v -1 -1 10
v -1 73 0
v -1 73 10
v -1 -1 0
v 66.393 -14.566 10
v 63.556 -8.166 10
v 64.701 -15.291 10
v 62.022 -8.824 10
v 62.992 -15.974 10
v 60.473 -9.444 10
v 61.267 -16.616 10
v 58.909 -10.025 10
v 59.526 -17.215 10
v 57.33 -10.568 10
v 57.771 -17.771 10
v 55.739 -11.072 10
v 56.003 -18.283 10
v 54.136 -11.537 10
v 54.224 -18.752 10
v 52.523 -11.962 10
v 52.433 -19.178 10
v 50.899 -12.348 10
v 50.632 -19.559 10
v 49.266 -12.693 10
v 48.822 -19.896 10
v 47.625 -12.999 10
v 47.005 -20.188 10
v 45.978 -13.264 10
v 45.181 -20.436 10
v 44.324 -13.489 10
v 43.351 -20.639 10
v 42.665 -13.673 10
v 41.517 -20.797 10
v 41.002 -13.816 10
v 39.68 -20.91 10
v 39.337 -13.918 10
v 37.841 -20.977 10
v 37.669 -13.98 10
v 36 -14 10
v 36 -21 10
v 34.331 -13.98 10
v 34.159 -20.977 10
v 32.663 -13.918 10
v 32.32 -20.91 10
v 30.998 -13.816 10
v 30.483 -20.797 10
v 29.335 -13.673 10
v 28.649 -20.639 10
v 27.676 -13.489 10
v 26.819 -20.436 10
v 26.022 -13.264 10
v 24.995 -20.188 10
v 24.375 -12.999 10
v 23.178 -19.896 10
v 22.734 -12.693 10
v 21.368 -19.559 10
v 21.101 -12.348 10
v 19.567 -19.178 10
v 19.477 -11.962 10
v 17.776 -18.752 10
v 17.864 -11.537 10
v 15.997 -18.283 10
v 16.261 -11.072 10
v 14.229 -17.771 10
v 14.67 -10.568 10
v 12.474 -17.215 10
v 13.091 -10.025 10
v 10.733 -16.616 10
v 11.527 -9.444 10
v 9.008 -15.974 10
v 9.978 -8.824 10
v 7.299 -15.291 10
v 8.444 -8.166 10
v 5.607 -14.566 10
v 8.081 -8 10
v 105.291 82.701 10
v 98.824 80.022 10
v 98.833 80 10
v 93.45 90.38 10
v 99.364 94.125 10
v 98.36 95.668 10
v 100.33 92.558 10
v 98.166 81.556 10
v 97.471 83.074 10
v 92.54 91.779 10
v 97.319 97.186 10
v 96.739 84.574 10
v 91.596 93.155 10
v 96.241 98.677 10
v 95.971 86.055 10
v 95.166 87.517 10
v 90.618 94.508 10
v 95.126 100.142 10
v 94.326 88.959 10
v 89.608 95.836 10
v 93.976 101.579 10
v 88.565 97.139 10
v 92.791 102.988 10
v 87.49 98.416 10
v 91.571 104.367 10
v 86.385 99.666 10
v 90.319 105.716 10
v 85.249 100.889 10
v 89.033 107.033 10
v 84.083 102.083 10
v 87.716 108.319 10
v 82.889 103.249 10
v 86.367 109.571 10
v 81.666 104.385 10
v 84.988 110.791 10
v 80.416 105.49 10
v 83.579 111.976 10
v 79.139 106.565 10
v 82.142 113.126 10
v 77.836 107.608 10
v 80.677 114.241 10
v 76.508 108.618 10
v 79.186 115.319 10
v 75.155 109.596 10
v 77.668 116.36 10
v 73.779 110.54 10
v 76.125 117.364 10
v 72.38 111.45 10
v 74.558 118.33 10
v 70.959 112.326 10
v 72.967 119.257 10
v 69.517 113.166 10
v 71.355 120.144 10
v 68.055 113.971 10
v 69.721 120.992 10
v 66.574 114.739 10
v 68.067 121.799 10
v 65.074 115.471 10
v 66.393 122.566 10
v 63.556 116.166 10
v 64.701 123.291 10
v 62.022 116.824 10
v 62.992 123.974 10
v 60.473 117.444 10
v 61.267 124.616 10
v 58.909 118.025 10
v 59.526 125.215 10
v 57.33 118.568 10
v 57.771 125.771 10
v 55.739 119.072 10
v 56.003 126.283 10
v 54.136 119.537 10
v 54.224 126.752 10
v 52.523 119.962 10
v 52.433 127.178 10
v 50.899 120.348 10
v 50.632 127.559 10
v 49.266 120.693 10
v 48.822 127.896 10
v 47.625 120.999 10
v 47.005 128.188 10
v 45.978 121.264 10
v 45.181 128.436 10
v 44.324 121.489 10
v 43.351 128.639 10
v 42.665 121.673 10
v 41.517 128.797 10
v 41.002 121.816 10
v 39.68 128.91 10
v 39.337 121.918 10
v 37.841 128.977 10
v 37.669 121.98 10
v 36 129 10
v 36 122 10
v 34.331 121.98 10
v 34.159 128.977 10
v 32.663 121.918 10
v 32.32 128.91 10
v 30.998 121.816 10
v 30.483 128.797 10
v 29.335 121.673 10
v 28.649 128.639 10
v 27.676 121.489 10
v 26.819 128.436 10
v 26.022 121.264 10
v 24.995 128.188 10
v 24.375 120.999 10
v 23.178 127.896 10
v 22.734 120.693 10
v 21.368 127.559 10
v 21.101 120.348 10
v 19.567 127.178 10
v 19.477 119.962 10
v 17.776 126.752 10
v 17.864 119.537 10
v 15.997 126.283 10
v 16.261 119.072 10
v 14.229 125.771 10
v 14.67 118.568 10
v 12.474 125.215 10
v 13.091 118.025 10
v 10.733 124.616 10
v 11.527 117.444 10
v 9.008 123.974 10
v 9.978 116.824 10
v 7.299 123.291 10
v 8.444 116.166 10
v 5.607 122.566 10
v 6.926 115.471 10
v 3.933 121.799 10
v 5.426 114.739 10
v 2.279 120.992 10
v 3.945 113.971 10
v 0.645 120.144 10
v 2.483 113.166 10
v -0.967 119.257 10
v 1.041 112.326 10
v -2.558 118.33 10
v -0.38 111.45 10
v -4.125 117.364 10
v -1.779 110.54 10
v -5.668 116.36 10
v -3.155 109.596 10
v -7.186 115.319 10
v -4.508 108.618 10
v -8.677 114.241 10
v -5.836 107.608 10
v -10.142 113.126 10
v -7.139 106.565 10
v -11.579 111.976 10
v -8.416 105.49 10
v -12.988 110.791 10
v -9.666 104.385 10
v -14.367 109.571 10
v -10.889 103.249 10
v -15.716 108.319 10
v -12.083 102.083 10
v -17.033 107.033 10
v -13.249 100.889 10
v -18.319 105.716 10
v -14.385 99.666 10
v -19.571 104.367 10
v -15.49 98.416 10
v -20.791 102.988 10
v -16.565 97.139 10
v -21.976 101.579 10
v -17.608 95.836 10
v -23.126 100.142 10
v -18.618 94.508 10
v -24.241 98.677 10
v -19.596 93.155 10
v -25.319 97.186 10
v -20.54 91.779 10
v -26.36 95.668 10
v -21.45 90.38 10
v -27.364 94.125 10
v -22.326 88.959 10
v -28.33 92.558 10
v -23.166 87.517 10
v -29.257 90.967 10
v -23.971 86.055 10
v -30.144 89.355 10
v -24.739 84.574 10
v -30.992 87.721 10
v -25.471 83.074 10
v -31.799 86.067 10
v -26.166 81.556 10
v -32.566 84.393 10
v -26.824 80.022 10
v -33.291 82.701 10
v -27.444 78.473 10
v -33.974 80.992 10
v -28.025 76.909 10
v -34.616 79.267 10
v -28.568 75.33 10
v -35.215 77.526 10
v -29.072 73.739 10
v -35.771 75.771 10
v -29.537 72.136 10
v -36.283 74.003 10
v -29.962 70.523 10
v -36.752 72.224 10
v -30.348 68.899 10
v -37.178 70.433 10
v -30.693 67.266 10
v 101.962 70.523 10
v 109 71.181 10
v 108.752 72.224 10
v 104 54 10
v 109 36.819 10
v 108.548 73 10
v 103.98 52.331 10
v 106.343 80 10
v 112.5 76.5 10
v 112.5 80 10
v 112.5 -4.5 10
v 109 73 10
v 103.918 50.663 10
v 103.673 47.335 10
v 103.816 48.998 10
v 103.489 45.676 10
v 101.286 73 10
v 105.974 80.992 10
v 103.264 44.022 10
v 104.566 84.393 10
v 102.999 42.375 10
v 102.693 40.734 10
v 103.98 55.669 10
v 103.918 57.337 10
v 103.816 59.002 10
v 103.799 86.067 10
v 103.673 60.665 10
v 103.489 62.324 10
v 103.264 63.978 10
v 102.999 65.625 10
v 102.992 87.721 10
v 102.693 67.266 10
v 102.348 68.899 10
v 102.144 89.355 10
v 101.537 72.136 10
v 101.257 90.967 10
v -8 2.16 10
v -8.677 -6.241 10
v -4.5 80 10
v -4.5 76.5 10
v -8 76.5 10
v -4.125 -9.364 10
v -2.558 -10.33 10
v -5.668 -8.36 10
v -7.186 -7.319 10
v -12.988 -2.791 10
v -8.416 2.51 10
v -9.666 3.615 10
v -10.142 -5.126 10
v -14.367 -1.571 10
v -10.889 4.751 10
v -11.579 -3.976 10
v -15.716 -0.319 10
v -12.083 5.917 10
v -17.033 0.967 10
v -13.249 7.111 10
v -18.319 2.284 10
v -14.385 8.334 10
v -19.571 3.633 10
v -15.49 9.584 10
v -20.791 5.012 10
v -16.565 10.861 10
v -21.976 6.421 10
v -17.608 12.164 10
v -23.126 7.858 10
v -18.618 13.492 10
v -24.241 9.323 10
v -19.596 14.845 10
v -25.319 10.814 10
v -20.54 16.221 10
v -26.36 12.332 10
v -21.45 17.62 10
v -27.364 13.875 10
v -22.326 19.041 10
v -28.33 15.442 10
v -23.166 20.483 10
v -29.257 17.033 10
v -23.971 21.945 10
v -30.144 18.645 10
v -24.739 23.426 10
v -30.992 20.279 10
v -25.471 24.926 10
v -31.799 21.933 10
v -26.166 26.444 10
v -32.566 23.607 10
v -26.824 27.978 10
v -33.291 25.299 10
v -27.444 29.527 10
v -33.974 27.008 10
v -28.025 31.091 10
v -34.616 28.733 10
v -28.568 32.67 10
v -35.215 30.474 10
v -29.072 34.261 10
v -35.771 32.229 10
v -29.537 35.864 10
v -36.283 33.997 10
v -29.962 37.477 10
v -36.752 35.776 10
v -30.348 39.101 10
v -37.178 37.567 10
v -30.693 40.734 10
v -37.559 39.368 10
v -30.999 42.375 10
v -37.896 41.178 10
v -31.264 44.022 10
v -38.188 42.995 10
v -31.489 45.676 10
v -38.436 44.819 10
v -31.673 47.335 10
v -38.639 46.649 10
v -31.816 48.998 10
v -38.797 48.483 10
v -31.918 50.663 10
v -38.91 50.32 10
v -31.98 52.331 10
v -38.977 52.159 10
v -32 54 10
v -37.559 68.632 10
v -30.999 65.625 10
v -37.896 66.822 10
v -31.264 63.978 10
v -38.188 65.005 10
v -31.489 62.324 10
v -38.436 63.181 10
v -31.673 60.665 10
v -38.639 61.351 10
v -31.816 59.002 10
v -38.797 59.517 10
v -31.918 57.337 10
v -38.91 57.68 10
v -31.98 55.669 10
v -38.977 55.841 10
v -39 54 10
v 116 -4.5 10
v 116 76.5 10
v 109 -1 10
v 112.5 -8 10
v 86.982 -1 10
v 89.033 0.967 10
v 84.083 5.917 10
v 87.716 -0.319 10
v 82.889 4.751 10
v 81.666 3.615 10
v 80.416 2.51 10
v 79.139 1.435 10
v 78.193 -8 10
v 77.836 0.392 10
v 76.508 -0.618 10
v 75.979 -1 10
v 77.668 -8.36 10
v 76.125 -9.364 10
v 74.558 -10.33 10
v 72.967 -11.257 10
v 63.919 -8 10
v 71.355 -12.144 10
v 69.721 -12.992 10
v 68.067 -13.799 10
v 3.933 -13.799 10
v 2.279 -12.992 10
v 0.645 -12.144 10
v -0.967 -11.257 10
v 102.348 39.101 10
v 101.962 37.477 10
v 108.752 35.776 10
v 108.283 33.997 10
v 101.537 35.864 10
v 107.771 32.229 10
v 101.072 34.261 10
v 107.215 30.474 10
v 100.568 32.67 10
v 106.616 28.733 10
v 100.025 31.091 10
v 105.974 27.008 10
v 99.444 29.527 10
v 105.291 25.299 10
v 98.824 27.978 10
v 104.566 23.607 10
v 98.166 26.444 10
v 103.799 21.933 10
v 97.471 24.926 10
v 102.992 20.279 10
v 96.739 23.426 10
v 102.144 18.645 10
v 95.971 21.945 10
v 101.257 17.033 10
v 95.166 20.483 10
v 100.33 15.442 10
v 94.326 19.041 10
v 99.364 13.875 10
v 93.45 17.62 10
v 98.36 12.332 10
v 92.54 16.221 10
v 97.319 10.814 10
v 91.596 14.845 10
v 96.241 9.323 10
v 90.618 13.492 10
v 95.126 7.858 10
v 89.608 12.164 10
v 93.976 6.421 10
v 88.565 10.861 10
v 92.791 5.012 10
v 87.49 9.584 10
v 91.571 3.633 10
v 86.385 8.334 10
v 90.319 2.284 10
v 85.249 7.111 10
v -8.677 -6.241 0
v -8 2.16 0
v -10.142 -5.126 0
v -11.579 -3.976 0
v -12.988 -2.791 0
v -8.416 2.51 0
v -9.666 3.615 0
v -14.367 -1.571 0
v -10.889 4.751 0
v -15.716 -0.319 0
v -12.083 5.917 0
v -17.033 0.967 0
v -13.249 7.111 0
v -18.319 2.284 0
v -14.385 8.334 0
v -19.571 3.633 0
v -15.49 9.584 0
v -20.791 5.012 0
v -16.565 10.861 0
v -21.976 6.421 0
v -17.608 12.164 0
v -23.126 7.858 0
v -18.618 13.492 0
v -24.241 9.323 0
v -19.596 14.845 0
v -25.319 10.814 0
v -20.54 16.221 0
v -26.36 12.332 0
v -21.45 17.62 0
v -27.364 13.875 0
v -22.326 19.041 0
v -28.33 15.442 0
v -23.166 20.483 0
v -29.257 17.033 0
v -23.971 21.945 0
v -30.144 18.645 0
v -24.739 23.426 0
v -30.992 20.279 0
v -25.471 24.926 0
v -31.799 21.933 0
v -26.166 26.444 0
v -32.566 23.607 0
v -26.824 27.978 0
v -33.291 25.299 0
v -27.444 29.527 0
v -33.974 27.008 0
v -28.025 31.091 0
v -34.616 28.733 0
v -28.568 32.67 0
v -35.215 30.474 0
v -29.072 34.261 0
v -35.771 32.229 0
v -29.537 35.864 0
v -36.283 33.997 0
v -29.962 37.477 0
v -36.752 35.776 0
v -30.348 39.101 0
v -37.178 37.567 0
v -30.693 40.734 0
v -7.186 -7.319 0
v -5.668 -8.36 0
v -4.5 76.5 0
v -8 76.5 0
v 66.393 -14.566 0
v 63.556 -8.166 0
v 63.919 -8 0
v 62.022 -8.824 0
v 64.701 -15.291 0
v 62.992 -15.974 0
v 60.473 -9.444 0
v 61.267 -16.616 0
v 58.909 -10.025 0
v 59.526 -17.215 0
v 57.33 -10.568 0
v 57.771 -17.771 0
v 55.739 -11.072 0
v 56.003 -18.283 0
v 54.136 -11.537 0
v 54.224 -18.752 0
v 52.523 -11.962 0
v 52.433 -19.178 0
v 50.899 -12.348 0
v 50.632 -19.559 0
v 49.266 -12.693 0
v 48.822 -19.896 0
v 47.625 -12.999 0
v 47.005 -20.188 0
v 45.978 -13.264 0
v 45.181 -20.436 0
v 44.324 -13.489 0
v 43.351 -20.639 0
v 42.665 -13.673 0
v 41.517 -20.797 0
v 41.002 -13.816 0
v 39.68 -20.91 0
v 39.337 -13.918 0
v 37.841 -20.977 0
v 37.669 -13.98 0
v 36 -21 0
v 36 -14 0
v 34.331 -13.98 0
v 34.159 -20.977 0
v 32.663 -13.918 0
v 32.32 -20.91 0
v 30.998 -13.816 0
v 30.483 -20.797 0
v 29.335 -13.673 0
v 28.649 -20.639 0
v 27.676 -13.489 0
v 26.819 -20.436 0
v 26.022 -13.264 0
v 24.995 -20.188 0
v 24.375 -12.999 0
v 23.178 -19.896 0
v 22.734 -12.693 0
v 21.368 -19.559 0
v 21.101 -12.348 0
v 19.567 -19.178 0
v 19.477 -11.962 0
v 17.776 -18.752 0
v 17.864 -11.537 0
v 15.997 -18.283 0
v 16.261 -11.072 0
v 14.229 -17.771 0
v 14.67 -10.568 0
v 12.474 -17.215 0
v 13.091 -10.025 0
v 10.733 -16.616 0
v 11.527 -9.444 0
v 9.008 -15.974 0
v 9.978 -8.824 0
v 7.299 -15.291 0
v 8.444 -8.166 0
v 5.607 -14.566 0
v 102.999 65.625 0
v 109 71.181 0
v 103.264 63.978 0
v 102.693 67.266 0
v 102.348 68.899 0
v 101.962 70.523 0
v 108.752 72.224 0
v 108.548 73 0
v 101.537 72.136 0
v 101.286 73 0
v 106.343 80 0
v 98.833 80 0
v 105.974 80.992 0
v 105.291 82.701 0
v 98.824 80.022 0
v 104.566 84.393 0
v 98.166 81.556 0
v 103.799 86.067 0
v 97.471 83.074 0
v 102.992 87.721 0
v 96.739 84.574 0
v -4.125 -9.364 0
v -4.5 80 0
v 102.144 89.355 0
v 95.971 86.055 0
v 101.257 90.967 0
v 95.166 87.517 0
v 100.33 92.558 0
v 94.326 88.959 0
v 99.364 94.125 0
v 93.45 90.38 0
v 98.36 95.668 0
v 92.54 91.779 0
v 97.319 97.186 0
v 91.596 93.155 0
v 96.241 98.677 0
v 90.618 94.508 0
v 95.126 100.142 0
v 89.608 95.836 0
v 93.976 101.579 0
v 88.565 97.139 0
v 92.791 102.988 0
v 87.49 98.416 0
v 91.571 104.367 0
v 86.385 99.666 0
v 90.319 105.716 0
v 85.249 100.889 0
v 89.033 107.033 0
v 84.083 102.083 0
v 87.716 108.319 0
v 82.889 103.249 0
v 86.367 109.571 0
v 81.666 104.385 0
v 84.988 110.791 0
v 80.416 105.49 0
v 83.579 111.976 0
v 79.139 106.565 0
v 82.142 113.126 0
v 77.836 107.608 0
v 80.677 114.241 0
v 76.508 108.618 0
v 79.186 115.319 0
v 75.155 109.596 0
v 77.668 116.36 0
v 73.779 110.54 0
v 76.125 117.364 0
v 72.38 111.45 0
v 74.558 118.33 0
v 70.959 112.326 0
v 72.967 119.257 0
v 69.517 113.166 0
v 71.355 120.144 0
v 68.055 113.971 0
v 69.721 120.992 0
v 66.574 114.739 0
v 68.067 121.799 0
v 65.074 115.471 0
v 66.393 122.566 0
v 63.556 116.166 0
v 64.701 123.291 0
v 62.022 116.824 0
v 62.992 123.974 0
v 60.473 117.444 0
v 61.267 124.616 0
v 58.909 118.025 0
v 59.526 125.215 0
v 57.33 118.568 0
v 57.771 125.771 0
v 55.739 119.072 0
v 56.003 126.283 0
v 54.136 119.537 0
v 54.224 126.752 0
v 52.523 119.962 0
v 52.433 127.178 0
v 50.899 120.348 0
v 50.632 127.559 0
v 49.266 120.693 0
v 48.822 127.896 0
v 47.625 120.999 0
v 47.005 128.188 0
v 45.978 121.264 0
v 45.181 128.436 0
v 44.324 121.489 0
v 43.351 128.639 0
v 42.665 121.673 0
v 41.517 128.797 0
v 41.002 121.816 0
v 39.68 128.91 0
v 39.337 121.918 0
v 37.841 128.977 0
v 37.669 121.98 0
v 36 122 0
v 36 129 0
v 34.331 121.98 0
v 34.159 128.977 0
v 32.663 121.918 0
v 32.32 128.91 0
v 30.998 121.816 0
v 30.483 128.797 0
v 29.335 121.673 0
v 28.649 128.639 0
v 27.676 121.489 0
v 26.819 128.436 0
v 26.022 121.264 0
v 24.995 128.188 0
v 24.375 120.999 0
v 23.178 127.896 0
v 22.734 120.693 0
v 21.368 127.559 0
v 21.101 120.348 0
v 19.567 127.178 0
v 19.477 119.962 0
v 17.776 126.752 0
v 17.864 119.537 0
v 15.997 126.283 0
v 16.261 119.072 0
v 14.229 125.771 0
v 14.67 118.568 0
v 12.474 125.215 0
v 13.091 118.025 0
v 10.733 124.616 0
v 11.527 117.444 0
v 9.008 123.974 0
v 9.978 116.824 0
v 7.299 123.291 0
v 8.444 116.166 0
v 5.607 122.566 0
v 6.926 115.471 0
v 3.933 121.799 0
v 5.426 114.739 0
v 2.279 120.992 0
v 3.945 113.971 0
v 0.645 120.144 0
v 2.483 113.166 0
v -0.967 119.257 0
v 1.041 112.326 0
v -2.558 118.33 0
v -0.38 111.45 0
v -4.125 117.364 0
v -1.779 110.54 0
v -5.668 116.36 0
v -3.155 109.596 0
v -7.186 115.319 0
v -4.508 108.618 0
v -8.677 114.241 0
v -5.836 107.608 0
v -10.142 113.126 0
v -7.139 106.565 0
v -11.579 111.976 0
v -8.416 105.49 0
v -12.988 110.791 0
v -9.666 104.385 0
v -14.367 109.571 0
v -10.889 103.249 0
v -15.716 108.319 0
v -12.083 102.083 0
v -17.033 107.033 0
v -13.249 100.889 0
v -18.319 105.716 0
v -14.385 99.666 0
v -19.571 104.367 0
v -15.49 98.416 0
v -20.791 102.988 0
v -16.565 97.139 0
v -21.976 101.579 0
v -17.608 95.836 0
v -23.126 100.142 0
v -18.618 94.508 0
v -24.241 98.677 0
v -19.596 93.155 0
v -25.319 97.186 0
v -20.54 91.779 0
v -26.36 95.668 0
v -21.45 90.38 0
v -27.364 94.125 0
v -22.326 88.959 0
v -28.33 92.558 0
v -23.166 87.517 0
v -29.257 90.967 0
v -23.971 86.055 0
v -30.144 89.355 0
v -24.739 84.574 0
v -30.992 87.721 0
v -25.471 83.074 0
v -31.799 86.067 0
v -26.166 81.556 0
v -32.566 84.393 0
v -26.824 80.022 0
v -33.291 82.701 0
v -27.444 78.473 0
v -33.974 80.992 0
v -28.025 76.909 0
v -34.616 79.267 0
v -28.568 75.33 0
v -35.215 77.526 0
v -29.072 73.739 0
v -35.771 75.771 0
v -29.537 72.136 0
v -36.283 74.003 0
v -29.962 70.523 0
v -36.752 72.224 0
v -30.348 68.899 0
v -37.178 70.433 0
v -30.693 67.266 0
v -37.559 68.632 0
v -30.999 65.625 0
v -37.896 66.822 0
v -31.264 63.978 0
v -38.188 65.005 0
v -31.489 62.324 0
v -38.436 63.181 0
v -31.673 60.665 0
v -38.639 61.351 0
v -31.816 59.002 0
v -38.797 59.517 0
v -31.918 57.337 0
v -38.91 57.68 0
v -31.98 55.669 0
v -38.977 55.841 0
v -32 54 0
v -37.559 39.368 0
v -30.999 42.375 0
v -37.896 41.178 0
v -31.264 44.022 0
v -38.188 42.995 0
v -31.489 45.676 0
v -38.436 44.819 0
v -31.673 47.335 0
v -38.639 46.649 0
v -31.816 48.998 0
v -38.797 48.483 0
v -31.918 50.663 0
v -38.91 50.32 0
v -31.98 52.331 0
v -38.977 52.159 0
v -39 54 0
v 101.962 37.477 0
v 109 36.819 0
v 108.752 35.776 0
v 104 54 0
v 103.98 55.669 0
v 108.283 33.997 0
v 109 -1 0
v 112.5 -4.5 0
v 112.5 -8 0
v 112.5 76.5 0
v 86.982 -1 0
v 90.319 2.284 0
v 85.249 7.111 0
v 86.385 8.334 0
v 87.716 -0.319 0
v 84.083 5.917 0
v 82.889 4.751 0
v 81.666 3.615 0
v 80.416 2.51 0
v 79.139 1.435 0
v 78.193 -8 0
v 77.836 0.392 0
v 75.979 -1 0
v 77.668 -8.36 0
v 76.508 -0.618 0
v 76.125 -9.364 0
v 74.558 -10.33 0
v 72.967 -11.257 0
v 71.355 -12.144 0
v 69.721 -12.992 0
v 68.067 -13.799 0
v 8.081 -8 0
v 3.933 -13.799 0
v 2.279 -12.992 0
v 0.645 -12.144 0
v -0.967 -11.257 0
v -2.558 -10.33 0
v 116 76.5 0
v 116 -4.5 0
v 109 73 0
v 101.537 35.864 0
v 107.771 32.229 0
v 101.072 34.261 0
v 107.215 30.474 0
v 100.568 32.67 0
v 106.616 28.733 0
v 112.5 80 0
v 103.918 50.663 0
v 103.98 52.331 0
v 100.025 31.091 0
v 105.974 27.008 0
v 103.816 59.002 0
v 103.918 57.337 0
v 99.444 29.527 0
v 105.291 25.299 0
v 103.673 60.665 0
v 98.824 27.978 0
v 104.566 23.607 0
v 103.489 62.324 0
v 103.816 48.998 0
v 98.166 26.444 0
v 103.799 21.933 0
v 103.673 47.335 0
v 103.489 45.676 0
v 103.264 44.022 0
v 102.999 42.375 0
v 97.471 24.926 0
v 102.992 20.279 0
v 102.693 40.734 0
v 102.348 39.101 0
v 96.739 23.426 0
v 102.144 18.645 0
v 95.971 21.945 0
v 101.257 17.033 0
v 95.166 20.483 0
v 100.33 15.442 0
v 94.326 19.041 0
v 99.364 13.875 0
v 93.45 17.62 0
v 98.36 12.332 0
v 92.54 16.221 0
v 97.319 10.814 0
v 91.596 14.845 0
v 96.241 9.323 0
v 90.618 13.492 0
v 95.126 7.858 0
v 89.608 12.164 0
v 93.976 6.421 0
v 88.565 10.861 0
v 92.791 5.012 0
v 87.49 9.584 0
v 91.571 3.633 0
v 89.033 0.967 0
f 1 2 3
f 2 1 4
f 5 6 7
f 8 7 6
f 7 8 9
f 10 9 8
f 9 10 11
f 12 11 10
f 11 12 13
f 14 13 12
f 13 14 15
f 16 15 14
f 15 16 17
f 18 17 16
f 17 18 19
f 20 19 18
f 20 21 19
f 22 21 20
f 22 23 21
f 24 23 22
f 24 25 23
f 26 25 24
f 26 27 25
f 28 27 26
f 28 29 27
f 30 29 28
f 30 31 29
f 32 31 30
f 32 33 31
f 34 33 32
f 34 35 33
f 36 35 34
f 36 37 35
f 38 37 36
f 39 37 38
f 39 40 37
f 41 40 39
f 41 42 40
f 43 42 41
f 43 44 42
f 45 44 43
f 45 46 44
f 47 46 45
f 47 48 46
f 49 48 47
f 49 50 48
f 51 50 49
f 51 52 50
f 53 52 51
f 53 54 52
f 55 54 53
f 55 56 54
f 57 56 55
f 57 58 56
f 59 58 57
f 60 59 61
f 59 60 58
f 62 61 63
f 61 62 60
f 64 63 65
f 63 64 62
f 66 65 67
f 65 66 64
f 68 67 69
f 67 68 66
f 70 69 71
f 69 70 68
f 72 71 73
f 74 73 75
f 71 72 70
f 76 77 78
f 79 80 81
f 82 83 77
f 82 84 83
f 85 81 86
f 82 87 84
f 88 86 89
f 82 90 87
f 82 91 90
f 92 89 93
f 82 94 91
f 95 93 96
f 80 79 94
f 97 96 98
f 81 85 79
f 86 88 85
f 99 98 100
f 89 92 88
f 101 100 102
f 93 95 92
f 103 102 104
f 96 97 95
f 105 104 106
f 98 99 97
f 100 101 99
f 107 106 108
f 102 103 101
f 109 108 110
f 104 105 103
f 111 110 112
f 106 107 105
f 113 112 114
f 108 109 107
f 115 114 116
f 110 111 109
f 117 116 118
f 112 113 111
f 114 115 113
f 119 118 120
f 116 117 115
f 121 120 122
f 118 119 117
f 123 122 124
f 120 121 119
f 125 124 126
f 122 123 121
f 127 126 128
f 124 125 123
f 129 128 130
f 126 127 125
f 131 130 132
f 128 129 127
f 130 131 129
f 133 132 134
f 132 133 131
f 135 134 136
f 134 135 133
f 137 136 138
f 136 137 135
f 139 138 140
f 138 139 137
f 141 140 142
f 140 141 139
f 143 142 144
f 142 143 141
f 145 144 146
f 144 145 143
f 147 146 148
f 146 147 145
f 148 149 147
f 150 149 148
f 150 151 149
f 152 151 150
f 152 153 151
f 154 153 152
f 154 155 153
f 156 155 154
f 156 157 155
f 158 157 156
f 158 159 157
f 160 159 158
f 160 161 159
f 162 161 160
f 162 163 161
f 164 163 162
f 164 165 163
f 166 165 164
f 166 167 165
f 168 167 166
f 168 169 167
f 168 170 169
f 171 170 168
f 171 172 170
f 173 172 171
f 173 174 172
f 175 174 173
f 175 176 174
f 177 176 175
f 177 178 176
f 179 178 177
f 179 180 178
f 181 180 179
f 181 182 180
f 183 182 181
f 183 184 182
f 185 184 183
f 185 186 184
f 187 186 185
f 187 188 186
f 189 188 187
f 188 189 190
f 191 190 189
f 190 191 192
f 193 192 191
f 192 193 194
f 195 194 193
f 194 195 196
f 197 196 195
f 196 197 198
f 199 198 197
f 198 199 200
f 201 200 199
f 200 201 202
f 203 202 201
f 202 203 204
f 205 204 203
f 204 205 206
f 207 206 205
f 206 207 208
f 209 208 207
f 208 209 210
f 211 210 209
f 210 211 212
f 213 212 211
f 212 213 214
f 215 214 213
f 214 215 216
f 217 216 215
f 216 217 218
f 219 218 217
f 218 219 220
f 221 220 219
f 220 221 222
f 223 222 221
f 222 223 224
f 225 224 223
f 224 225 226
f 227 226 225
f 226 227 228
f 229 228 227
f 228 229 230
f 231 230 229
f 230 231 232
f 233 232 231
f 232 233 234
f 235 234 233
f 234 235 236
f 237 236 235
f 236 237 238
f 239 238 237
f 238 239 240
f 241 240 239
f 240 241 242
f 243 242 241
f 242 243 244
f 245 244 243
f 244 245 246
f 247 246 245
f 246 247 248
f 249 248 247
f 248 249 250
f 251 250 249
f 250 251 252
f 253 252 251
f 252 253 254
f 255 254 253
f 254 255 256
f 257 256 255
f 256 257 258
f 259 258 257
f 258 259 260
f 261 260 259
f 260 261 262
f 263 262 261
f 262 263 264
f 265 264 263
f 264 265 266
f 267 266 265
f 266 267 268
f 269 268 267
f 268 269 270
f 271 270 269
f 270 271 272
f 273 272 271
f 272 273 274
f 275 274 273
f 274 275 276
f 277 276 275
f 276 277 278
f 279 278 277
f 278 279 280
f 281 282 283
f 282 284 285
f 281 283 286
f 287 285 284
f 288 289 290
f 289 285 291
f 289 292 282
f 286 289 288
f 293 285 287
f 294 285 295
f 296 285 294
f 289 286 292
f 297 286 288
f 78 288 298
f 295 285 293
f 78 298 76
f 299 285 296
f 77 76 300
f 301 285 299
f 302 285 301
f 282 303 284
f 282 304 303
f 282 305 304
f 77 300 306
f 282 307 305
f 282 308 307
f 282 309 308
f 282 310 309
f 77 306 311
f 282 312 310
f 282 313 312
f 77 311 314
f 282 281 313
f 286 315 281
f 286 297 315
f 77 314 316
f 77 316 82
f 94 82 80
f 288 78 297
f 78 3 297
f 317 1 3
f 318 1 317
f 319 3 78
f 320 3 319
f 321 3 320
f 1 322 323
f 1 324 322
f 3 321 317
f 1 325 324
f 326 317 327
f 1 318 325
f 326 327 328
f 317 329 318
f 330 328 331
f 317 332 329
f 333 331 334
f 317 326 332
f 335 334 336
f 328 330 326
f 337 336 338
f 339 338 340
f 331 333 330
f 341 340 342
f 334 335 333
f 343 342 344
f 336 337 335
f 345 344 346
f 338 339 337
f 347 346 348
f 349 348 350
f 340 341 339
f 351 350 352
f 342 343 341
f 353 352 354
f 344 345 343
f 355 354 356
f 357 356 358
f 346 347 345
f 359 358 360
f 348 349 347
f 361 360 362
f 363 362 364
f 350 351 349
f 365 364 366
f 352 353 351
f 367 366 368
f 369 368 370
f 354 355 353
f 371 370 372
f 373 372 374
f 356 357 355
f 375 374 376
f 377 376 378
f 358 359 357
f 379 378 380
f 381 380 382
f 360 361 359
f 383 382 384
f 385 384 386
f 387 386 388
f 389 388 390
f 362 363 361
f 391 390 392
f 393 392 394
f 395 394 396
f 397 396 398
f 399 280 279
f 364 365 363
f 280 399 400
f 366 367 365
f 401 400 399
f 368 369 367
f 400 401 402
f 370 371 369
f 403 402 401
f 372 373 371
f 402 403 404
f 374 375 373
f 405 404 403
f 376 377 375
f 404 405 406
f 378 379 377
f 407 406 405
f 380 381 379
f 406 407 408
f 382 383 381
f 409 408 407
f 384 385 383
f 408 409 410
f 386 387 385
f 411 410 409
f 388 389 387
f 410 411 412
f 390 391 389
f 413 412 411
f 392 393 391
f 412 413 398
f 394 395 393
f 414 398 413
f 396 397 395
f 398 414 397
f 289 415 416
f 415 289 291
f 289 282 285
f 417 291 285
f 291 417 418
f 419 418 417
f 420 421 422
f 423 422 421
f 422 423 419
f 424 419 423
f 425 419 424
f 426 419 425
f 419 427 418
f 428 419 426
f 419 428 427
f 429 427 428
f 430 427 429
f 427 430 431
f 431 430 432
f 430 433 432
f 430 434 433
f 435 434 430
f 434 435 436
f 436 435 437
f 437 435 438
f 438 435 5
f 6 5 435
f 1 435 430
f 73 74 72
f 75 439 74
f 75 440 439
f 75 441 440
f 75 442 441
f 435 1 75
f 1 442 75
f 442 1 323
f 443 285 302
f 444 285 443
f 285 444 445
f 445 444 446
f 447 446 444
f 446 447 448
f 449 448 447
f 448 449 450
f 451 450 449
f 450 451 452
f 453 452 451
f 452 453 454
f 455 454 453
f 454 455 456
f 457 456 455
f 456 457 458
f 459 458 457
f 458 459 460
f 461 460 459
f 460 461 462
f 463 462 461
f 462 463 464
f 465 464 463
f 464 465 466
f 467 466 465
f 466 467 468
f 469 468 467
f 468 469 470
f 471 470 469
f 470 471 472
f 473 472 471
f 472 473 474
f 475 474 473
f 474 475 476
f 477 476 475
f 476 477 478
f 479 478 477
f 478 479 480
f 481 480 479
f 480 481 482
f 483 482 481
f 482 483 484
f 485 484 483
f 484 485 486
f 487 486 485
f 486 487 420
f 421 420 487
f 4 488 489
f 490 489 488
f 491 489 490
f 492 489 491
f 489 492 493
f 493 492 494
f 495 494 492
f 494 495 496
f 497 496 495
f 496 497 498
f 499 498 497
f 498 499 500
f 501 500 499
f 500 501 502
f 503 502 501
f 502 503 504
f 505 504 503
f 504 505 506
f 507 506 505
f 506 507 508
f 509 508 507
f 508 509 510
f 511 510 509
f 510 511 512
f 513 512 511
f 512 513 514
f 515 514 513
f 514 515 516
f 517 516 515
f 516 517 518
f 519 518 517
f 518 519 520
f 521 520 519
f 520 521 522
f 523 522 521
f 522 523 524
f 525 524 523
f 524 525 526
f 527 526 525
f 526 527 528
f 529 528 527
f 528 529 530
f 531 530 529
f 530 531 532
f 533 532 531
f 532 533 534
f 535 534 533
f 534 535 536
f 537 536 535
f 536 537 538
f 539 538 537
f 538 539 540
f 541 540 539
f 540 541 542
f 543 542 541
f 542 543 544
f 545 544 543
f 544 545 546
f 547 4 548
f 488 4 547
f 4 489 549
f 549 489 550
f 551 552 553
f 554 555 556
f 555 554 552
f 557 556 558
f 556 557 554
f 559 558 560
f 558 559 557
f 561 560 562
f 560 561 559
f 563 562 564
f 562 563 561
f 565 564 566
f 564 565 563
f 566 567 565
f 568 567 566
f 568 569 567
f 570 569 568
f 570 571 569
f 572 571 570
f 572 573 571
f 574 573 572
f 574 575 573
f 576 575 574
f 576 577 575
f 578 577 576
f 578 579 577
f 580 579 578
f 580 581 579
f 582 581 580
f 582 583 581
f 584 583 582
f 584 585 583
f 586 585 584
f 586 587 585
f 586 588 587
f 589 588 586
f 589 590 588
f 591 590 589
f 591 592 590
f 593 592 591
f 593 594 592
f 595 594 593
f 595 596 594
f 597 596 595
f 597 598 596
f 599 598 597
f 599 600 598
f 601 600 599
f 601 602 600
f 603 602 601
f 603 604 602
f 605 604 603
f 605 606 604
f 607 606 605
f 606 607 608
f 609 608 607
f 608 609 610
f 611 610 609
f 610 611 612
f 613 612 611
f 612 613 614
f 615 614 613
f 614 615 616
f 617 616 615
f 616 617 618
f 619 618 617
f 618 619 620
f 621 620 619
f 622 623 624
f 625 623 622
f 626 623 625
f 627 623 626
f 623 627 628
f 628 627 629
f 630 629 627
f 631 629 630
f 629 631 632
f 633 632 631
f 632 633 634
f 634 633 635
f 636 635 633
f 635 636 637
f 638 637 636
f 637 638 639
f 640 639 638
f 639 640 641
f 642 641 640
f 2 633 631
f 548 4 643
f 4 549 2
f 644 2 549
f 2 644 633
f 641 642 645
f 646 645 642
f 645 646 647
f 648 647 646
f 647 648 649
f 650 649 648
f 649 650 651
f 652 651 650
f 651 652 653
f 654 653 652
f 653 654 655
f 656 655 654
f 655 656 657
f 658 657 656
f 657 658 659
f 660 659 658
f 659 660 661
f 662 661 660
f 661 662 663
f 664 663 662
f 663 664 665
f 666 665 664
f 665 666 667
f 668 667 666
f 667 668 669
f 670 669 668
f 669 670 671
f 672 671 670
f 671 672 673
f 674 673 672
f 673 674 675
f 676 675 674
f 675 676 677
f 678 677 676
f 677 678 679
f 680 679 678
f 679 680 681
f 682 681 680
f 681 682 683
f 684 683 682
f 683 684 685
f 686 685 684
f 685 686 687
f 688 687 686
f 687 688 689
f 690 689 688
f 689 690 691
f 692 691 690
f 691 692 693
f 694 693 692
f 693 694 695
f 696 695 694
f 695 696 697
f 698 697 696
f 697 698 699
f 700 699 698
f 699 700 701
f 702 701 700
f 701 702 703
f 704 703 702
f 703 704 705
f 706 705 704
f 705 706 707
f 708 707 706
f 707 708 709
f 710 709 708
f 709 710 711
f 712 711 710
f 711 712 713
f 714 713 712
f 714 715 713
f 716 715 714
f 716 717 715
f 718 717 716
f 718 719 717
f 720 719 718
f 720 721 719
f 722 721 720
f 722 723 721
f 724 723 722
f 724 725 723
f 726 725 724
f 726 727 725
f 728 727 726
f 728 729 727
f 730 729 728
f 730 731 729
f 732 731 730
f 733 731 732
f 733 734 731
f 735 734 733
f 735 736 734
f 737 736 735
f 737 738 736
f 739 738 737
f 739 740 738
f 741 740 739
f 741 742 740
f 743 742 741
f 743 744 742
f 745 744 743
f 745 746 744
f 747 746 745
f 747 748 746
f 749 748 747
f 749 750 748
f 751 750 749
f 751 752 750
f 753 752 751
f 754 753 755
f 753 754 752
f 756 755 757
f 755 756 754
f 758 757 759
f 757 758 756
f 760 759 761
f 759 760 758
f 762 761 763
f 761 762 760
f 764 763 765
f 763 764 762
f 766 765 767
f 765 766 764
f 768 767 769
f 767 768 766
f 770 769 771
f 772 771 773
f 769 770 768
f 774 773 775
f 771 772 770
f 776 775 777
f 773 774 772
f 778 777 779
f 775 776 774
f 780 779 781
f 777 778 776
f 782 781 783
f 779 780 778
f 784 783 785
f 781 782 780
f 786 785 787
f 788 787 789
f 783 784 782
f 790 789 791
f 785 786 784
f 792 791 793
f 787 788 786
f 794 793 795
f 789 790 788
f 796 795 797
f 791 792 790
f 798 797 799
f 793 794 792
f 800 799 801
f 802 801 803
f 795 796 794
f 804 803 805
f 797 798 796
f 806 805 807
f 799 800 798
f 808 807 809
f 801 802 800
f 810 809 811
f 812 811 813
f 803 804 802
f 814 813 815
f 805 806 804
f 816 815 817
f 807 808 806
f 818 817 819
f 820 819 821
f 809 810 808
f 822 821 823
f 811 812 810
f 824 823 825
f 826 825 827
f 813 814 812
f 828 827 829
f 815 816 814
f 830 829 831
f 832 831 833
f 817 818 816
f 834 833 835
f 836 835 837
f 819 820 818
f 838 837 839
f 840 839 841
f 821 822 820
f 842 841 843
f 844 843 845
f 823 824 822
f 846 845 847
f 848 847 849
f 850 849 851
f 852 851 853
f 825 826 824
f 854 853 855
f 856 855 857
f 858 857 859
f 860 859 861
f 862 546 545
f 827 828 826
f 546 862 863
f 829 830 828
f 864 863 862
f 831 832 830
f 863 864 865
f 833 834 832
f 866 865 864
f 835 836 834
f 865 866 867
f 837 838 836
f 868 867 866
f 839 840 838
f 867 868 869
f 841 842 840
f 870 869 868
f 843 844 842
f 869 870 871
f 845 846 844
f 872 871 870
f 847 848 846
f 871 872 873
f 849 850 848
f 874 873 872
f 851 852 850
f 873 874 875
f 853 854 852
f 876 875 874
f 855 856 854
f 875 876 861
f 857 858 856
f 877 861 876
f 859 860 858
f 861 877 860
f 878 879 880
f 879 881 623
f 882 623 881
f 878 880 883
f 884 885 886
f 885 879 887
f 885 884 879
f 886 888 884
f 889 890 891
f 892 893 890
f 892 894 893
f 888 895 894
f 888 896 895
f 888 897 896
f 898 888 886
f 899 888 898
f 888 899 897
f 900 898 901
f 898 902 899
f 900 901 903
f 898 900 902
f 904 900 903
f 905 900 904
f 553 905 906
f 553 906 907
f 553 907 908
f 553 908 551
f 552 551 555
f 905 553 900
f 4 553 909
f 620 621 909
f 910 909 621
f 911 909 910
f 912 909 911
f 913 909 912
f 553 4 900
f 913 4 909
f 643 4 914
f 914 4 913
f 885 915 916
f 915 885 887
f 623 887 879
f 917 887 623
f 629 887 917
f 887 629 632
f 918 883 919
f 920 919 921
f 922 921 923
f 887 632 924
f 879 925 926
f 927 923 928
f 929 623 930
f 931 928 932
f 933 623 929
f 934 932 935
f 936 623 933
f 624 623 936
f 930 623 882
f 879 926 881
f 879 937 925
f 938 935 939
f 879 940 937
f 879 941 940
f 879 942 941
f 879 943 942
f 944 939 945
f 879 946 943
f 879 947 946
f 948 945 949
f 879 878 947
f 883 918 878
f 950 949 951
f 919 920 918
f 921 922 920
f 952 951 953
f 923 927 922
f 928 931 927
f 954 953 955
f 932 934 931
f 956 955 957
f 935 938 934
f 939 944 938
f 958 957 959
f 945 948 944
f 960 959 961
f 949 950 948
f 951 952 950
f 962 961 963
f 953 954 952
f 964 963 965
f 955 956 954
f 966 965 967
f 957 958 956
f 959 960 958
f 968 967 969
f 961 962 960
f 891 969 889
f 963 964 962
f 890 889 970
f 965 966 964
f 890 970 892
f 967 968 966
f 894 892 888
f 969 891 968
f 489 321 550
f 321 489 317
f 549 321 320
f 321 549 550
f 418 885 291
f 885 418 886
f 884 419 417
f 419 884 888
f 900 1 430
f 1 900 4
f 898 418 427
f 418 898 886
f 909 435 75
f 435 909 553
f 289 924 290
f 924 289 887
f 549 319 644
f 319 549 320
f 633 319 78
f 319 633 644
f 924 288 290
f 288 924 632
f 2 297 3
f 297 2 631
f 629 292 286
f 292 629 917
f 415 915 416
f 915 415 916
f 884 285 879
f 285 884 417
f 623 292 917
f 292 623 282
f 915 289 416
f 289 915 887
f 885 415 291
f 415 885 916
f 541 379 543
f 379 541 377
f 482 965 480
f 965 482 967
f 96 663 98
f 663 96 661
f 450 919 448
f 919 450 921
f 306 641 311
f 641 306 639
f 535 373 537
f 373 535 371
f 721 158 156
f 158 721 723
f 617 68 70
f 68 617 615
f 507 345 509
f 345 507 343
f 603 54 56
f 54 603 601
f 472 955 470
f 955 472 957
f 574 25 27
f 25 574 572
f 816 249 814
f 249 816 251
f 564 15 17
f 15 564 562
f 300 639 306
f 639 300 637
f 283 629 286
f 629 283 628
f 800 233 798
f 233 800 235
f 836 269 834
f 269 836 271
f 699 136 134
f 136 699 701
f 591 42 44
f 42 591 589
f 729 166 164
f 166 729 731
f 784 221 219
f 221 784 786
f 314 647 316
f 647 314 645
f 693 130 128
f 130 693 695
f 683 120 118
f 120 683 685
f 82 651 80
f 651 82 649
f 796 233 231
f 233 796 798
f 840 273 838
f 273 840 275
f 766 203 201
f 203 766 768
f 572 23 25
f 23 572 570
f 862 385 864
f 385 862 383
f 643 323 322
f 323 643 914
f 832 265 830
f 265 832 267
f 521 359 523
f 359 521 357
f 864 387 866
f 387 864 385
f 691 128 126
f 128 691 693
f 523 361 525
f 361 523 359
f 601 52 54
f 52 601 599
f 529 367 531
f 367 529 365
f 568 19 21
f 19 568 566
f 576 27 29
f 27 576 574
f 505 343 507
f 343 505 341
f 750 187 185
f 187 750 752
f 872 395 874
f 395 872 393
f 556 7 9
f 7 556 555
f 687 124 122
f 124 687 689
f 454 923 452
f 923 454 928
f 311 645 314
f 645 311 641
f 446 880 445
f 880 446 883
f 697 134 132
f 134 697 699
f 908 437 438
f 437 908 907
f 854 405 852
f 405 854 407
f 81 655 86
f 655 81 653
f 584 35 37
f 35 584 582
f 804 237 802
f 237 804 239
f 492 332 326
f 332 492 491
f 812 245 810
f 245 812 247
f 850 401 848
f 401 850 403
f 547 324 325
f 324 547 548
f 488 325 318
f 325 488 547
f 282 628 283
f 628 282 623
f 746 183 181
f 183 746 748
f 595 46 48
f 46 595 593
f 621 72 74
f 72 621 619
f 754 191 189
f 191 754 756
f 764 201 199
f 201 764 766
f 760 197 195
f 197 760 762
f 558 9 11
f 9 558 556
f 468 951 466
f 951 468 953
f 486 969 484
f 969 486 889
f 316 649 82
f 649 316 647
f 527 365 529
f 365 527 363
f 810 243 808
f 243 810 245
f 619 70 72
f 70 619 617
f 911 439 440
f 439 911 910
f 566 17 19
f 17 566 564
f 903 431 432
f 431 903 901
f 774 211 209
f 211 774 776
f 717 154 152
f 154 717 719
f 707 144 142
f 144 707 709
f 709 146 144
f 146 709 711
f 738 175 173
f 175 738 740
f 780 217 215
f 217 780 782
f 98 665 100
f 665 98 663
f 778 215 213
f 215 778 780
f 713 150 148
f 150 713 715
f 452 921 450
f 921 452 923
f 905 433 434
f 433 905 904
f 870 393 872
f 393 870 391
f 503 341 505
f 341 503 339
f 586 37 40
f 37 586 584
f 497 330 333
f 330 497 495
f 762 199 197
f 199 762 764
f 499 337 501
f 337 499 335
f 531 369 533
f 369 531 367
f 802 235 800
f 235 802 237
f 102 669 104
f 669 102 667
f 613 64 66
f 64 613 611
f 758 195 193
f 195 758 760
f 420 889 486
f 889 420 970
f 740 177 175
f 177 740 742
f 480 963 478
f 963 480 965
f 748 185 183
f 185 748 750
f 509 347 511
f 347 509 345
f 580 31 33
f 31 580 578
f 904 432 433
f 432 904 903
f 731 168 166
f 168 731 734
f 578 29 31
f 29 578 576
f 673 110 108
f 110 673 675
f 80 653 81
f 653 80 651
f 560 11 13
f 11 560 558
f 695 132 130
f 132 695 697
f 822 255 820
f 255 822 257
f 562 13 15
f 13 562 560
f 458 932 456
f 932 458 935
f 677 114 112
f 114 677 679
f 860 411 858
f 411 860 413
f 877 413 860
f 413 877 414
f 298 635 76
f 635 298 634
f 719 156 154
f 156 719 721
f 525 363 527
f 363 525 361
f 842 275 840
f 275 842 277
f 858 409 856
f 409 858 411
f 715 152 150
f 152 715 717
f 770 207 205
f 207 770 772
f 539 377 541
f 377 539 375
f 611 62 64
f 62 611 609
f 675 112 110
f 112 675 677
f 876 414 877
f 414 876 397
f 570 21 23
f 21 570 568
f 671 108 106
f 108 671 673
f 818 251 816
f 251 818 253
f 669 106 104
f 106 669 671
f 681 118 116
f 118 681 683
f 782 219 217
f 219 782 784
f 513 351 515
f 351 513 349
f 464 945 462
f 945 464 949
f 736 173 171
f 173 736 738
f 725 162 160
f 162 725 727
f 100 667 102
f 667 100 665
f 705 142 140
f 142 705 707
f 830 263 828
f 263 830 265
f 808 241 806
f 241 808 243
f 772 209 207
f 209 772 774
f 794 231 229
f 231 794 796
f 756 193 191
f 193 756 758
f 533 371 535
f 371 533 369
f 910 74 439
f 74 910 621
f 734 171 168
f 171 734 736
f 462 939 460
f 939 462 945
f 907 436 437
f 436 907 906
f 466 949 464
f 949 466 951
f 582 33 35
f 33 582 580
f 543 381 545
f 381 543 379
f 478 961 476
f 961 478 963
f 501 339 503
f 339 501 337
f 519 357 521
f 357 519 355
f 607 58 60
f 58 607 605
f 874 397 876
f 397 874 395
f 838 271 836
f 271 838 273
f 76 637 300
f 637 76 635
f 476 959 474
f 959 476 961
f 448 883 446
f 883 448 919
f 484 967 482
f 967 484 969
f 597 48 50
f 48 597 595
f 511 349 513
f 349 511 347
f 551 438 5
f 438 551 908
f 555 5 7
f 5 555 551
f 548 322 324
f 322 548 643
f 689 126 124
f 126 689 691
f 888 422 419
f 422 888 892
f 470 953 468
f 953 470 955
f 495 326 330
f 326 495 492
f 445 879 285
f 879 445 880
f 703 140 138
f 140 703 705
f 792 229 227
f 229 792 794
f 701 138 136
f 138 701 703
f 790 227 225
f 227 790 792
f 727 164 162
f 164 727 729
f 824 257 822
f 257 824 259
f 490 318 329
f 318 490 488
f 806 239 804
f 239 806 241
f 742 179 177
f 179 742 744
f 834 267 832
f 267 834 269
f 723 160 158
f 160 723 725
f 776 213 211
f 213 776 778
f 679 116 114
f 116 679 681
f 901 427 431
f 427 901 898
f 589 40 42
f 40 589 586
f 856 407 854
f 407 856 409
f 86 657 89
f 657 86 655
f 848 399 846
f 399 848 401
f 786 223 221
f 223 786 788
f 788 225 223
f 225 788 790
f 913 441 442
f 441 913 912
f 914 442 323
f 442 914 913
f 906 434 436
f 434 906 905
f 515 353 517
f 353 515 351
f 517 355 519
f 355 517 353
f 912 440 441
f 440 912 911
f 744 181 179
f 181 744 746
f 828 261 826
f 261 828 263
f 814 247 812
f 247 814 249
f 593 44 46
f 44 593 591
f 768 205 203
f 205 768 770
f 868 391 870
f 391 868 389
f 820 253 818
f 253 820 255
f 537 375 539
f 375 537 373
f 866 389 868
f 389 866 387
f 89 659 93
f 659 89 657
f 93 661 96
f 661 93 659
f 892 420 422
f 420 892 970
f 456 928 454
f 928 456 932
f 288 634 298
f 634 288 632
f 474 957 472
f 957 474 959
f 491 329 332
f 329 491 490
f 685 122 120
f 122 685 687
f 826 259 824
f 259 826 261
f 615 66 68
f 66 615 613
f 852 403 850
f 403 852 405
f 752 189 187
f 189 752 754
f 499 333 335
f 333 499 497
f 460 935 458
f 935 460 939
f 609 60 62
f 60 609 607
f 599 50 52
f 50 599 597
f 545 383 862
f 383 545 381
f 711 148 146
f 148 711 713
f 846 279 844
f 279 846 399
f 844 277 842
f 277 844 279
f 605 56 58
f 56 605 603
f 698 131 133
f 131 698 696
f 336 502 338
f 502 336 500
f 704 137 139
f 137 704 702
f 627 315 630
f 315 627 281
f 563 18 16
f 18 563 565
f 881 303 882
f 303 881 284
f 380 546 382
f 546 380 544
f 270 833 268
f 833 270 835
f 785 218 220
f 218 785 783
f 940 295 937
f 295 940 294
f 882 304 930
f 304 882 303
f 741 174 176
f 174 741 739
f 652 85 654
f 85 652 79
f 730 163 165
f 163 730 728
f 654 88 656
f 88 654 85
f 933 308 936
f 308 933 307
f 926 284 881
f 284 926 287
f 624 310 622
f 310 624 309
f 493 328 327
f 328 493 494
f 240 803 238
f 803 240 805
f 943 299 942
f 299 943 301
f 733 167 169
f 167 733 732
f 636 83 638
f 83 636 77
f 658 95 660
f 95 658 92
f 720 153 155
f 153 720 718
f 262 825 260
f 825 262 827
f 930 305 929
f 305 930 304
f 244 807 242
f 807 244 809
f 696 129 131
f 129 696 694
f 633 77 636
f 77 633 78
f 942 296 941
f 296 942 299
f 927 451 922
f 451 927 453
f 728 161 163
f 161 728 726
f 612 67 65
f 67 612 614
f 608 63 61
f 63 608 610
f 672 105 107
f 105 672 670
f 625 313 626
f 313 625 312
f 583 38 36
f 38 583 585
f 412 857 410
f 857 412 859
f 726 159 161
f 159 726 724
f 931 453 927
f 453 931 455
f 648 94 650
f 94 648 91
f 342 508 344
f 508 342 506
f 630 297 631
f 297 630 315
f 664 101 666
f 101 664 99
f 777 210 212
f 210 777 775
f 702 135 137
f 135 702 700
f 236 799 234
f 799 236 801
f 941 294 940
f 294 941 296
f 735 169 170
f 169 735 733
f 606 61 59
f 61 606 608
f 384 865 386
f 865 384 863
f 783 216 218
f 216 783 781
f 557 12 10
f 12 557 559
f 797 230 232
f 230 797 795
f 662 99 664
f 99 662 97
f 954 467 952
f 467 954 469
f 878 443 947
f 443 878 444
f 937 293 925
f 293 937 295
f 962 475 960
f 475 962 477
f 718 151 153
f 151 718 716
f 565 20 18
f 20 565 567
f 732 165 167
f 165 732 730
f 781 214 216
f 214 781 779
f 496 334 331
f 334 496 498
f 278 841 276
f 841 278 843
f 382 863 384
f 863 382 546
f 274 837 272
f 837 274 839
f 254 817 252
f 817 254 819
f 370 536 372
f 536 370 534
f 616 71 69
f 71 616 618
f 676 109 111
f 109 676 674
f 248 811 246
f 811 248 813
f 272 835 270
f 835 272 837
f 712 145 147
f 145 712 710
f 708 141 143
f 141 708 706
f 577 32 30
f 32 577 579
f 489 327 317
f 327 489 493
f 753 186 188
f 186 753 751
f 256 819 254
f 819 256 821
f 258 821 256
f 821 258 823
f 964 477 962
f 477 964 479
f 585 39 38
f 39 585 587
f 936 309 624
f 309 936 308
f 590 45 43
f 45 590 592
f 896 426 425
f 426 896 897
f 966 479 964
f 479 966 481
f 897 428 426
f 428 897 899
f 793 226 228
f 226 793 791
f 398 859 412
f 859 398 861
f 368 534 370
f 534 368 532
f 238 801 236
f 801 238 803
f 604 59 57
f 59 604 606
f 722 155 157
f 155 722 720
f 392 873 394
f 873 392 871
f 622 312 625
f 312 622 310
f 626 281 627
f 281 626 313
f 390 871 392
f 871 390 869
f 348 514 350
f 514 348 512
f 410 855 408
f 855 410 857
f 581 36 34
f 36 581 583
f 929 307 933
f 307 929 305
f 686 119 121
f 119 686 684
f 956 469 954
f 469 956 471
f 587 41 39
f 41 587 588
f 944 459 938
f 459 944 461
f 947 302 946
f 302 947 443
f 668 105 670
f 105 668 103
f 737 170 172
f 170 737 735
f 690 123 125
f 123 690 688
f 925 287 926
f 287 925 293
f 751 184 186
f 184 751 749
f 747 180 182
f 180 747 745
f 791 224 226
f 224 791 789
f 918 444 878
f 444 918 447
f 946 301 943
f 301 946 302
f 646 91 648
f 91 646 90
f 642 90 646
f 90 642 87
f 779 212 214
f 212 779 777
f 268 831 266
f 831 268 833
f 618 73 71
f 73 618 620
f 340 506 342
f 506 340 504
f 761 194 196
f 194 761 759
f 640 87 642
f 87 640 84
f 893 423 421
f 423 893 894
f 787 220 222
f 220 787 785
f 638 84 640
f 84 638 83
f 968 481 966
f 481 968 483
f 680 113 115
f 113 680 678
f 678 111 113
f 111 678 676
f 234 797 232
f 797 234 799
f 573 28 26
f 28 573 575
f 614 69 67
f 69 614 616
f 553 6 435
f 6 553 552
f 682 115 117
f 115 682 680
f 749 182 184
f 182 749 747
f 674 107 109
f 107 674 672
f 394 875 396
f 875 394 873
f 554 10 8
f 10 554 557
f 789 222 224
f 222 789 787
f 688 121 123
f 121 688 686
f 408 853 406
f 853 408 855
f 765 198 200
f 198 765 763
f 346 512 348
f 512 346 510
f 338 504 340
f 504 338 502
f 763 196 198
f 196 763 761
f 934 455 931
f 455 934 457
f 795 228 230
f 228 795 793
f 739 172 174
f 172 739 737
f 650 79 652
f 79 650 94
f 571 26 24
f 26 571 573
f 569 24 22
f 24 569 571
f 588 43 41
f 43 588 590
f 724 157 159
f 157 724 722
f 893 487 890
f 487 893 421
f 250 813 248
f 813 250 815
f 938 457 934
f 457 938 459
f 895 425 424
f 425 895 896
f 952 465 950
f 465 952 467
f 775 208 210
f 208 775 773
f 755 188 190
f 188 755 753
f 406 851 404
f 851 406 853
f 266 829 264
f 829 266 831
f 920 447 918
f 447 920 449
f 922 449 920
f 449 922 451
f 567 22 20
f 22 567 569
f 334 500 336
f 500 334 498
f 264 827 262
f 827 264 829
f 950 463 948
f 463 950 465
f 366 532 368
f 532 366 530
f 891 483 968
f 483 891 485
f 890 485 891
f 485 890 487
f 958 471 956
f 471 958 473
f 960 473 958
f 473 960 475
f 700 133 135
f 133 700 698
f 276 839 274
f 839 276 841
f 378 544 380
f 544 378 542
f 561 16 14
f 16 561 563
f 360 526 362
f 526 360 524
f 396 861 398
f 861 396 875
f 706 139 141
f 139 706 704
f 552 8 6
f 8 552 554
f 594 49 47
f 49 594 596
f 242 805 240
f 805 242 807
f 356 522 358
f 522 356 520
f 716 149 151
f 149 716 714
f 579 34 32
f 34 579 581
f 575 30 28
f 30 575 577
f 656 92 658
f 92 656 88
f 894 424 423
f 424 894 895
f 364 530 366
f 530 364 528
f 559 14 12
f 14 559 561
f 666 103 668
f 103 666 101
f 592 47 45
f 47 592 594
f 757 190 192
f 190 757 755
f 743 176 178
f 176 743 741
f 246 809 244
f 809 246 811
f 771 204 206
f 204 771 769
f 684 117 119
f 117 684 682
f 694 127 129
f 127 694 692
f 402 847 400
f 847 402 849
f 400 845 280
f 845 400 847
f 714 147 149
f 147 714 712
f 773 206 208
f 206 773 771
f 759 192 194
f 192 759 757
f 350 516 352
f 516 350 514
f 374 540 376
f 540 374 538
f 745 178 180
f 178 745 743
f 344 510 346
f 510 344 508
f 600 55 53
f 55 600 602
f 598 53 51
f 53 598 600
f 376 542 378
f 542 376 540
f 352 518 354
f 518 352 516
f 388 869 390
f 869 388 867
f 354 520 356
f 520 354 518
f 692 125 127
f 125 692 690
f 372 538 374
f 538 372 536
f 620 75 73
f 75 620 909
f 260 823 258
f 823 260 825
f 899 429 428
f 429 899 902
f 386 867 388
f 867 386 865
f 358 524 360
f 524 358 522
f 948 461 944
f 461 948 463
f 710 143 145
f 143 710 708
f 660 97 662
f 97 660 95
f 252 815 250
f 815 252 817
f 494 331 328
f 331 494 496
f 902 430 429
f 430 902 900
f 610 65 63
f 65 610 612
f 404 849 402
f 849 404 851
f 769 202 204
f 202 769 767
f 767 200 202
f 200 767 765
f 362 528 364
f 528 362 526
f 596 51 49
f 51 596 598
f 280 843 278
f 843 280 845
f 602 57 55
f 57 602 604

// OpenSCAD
// Generated by SolidPython 1.1.3 on 2026-06-23 12:54:52


union() {
	union() {
		translate(v = [-4.5000000000, 36.0000000000, 5.0000000000]) {
			cube(center = true, size = [7, 81, 10]);
		}
		translate(v = [54.0000000000, -4.5000000000, 5.0000000000]) {
			cube(center = true, size = [117, 7, 10]);
		}
		translate(v = [0, 81]) {
			translate(v = [54.0000000000, -4.5000000000, 5.0000000000]) {
				cube(center = true, size = [117, 7, 10]);
			}
		}
		translate(v = [117, 0]) {
			translate(v = [-4.5000000000, 36.0000000000, 5.0000000000]) {
				cube(center = true, size = [7, 81, 10]);
			}
		}
	}
	translate(v = [36.0000000000, 54.0000000000]) {
		difference() {
			cylinder($fn = 256, h = 10, r = 75.0000000000);
			cylinder($fn = 256, h = 10, r = 68.0000000000);
		}
	}
}
/***********************************************
*********      SolidPython code:      **********
************************************************

"""SCAD file export functions.

This module provides functions for exporting OpenSCAD geometries to .scad files.
"""

from typing import Dict, Optional
from pathlib import Path
import solid

from .config import ExportConfiguration, FileNamingConfig


def export_scad(
    geometry: solid.OpenSCADObject, output_path: Path, header: Optional[str] = None
) -> Path:
    """Export geometry to SCAD file.

    Parameters
    ----------
    geometry : solid.OpenSCADObject
        Geometry to export.
    output_path : Path
        Output file path.
    header : str, optional
        Header comment to add to SCAD file.

    Returns
    -------
    Path
        Path to created SCAD file.

    Raises
    ------
    IOError
        If file cannot be written.

    Examples
    --------
    >>> from pathlib import Path
    >>> import solid
    >>>
    >>> geometry = solid.cube([10, 10, 10])
    >>> output_path = Path('output/device.scad')
    >>> export_scad(geometry, output_path)
    """
    # Ensure parent directory exists
    output_path.parent.mkdir(parents=True, exist_ok=True)

    # Render to file
    try:
        solid.scad_render_to_file(geometry, str(output_path))
    except Exception as e:
        raise IOError(f"Failed to write SCAD file to {output_path}: {e}")

    _normalize_scad_file(output_path)

    # Add header if provided
    if header:
        _add_header_to_scad(output_path, header)
        _normalize_scad_file(output_path)

    return output_path


def _normalize_scad_file(scad_path: Path) -> None:
    """Strip trailing whitespace from generated SCAD text."""
    content = scad_path.read_text()
    normalized = "\n".join(line.rstrip() for line in content.splitlines()) + "\n"
    if normalized != content:
        scad_path.write_text(normalized)


def export_multiple_scad(
    geometries: Dict[str, solid.OpenSCADObject],
    config: ExportConfiguration,
    naming_config: Optional[FileNamingConfig] = None,
) -> Dict[str, Path]:
    """Export multiple geometries to SCAD files.

    Parameters
    ----------
    geometries : dict
        Dictionary mapping prefixes to geometries.
        Keys are used as filename prefixes.
    config : ExportConfiguration
        Export configuration.
    naming_config : FileNamingConfig, optional
        File naming configuration.

    Returns
    -------
    dict
        Dictionary mapping prefixes to output paths.

    Examples
    --------
    >>> geometries = {
    ...     'wells': wells_geometry,
    ...     'channels': channels_geometry,
    ...     'device': device_geometry
    ... }
    >>> config = ExportConfiguration(output_directory=Path('output'))
    >>> paths = export_multiple_scad(geometries, config)
    """
    output_paths = {}

    for prefix, geometry in geometries.items():
        # Create naming config for this geometry
        if naming_config:
            file_config = FileNamingConfig(
                prefix=prefix,
                version=naming_config.version,
                grid_size=naming_config.grid_size,
                suffix=naming_config.suffix,
            )
        else:
            file_config = FileNamingConfig(prefix=prefix)

        # Generate filename
        filename = file_config.generate_filename("scad")
        output_path = config.get_output_path(filename)

        # Export
        export_scad(geometry, output_path)
        output_paths[prefix] = output_path

    return output_paths


def _add_header_to_scad(scad_path: Path, header: str):
    """Add header comment to existing SCAD file.

    Parameters
    ----------
    scad_path : Path
        Path to SCAD file.
    header : str
        Header text to add.
    """
    # Read existing content
    with open(scad_path, "r") as f:
        content = f.read()

    # Prepend header
    header_comment = f"// {header}\n\n"
    with open(scad_path, "w") as f:
        f.write(header_comment + content)


def generate_scad_header(
    device_name: str, version: Optional[str] = None, description: Optional[str] = None
) -> str:
    """Generate SCAD file header comment.

    Parameters
    ----------
    device_name : str
        Device name.
    version : str, optional
        Version string.
    description : str, optional
        Device description.

    Returns
    -------
    str
        Header comment text.

    Examples
    --------
    >>> header = generate_scad_header(
    ...     'Two Compartment Device',
    ...     version='v1',
    ...     description='96-well format with microchannels'
    ... )
    """
    lines = []
    lines.append("=" * 60)
    lines.append(f"Device: {device_name}")

    if version:
        lines.append(f"Version: {version}")

    if description:
        lines.append(f"Description: {description}")

    lines.append("Generated by OpenMFD")
    lines.append("=" * 60)

    return "\n".join(lines)


def validate_scad_file(scad_path: Path) -> bool:
    """Validate that SCAD file exists and is readable.

    Parameters
    ----------
    scad_path : Path
        Path to SCAD file.

    Returns
    -------
    bool
        True if file is valid, False otherwise.
    """
    if not scad_path.exists():
        return False

    if not scad_path.is_file():
        return False

    # Try to read file
    try:
        with open(scad_path, "r") as f:
            content = f.read()
        return len(content) > 0
    except Exception:
        return False


************************************************/
